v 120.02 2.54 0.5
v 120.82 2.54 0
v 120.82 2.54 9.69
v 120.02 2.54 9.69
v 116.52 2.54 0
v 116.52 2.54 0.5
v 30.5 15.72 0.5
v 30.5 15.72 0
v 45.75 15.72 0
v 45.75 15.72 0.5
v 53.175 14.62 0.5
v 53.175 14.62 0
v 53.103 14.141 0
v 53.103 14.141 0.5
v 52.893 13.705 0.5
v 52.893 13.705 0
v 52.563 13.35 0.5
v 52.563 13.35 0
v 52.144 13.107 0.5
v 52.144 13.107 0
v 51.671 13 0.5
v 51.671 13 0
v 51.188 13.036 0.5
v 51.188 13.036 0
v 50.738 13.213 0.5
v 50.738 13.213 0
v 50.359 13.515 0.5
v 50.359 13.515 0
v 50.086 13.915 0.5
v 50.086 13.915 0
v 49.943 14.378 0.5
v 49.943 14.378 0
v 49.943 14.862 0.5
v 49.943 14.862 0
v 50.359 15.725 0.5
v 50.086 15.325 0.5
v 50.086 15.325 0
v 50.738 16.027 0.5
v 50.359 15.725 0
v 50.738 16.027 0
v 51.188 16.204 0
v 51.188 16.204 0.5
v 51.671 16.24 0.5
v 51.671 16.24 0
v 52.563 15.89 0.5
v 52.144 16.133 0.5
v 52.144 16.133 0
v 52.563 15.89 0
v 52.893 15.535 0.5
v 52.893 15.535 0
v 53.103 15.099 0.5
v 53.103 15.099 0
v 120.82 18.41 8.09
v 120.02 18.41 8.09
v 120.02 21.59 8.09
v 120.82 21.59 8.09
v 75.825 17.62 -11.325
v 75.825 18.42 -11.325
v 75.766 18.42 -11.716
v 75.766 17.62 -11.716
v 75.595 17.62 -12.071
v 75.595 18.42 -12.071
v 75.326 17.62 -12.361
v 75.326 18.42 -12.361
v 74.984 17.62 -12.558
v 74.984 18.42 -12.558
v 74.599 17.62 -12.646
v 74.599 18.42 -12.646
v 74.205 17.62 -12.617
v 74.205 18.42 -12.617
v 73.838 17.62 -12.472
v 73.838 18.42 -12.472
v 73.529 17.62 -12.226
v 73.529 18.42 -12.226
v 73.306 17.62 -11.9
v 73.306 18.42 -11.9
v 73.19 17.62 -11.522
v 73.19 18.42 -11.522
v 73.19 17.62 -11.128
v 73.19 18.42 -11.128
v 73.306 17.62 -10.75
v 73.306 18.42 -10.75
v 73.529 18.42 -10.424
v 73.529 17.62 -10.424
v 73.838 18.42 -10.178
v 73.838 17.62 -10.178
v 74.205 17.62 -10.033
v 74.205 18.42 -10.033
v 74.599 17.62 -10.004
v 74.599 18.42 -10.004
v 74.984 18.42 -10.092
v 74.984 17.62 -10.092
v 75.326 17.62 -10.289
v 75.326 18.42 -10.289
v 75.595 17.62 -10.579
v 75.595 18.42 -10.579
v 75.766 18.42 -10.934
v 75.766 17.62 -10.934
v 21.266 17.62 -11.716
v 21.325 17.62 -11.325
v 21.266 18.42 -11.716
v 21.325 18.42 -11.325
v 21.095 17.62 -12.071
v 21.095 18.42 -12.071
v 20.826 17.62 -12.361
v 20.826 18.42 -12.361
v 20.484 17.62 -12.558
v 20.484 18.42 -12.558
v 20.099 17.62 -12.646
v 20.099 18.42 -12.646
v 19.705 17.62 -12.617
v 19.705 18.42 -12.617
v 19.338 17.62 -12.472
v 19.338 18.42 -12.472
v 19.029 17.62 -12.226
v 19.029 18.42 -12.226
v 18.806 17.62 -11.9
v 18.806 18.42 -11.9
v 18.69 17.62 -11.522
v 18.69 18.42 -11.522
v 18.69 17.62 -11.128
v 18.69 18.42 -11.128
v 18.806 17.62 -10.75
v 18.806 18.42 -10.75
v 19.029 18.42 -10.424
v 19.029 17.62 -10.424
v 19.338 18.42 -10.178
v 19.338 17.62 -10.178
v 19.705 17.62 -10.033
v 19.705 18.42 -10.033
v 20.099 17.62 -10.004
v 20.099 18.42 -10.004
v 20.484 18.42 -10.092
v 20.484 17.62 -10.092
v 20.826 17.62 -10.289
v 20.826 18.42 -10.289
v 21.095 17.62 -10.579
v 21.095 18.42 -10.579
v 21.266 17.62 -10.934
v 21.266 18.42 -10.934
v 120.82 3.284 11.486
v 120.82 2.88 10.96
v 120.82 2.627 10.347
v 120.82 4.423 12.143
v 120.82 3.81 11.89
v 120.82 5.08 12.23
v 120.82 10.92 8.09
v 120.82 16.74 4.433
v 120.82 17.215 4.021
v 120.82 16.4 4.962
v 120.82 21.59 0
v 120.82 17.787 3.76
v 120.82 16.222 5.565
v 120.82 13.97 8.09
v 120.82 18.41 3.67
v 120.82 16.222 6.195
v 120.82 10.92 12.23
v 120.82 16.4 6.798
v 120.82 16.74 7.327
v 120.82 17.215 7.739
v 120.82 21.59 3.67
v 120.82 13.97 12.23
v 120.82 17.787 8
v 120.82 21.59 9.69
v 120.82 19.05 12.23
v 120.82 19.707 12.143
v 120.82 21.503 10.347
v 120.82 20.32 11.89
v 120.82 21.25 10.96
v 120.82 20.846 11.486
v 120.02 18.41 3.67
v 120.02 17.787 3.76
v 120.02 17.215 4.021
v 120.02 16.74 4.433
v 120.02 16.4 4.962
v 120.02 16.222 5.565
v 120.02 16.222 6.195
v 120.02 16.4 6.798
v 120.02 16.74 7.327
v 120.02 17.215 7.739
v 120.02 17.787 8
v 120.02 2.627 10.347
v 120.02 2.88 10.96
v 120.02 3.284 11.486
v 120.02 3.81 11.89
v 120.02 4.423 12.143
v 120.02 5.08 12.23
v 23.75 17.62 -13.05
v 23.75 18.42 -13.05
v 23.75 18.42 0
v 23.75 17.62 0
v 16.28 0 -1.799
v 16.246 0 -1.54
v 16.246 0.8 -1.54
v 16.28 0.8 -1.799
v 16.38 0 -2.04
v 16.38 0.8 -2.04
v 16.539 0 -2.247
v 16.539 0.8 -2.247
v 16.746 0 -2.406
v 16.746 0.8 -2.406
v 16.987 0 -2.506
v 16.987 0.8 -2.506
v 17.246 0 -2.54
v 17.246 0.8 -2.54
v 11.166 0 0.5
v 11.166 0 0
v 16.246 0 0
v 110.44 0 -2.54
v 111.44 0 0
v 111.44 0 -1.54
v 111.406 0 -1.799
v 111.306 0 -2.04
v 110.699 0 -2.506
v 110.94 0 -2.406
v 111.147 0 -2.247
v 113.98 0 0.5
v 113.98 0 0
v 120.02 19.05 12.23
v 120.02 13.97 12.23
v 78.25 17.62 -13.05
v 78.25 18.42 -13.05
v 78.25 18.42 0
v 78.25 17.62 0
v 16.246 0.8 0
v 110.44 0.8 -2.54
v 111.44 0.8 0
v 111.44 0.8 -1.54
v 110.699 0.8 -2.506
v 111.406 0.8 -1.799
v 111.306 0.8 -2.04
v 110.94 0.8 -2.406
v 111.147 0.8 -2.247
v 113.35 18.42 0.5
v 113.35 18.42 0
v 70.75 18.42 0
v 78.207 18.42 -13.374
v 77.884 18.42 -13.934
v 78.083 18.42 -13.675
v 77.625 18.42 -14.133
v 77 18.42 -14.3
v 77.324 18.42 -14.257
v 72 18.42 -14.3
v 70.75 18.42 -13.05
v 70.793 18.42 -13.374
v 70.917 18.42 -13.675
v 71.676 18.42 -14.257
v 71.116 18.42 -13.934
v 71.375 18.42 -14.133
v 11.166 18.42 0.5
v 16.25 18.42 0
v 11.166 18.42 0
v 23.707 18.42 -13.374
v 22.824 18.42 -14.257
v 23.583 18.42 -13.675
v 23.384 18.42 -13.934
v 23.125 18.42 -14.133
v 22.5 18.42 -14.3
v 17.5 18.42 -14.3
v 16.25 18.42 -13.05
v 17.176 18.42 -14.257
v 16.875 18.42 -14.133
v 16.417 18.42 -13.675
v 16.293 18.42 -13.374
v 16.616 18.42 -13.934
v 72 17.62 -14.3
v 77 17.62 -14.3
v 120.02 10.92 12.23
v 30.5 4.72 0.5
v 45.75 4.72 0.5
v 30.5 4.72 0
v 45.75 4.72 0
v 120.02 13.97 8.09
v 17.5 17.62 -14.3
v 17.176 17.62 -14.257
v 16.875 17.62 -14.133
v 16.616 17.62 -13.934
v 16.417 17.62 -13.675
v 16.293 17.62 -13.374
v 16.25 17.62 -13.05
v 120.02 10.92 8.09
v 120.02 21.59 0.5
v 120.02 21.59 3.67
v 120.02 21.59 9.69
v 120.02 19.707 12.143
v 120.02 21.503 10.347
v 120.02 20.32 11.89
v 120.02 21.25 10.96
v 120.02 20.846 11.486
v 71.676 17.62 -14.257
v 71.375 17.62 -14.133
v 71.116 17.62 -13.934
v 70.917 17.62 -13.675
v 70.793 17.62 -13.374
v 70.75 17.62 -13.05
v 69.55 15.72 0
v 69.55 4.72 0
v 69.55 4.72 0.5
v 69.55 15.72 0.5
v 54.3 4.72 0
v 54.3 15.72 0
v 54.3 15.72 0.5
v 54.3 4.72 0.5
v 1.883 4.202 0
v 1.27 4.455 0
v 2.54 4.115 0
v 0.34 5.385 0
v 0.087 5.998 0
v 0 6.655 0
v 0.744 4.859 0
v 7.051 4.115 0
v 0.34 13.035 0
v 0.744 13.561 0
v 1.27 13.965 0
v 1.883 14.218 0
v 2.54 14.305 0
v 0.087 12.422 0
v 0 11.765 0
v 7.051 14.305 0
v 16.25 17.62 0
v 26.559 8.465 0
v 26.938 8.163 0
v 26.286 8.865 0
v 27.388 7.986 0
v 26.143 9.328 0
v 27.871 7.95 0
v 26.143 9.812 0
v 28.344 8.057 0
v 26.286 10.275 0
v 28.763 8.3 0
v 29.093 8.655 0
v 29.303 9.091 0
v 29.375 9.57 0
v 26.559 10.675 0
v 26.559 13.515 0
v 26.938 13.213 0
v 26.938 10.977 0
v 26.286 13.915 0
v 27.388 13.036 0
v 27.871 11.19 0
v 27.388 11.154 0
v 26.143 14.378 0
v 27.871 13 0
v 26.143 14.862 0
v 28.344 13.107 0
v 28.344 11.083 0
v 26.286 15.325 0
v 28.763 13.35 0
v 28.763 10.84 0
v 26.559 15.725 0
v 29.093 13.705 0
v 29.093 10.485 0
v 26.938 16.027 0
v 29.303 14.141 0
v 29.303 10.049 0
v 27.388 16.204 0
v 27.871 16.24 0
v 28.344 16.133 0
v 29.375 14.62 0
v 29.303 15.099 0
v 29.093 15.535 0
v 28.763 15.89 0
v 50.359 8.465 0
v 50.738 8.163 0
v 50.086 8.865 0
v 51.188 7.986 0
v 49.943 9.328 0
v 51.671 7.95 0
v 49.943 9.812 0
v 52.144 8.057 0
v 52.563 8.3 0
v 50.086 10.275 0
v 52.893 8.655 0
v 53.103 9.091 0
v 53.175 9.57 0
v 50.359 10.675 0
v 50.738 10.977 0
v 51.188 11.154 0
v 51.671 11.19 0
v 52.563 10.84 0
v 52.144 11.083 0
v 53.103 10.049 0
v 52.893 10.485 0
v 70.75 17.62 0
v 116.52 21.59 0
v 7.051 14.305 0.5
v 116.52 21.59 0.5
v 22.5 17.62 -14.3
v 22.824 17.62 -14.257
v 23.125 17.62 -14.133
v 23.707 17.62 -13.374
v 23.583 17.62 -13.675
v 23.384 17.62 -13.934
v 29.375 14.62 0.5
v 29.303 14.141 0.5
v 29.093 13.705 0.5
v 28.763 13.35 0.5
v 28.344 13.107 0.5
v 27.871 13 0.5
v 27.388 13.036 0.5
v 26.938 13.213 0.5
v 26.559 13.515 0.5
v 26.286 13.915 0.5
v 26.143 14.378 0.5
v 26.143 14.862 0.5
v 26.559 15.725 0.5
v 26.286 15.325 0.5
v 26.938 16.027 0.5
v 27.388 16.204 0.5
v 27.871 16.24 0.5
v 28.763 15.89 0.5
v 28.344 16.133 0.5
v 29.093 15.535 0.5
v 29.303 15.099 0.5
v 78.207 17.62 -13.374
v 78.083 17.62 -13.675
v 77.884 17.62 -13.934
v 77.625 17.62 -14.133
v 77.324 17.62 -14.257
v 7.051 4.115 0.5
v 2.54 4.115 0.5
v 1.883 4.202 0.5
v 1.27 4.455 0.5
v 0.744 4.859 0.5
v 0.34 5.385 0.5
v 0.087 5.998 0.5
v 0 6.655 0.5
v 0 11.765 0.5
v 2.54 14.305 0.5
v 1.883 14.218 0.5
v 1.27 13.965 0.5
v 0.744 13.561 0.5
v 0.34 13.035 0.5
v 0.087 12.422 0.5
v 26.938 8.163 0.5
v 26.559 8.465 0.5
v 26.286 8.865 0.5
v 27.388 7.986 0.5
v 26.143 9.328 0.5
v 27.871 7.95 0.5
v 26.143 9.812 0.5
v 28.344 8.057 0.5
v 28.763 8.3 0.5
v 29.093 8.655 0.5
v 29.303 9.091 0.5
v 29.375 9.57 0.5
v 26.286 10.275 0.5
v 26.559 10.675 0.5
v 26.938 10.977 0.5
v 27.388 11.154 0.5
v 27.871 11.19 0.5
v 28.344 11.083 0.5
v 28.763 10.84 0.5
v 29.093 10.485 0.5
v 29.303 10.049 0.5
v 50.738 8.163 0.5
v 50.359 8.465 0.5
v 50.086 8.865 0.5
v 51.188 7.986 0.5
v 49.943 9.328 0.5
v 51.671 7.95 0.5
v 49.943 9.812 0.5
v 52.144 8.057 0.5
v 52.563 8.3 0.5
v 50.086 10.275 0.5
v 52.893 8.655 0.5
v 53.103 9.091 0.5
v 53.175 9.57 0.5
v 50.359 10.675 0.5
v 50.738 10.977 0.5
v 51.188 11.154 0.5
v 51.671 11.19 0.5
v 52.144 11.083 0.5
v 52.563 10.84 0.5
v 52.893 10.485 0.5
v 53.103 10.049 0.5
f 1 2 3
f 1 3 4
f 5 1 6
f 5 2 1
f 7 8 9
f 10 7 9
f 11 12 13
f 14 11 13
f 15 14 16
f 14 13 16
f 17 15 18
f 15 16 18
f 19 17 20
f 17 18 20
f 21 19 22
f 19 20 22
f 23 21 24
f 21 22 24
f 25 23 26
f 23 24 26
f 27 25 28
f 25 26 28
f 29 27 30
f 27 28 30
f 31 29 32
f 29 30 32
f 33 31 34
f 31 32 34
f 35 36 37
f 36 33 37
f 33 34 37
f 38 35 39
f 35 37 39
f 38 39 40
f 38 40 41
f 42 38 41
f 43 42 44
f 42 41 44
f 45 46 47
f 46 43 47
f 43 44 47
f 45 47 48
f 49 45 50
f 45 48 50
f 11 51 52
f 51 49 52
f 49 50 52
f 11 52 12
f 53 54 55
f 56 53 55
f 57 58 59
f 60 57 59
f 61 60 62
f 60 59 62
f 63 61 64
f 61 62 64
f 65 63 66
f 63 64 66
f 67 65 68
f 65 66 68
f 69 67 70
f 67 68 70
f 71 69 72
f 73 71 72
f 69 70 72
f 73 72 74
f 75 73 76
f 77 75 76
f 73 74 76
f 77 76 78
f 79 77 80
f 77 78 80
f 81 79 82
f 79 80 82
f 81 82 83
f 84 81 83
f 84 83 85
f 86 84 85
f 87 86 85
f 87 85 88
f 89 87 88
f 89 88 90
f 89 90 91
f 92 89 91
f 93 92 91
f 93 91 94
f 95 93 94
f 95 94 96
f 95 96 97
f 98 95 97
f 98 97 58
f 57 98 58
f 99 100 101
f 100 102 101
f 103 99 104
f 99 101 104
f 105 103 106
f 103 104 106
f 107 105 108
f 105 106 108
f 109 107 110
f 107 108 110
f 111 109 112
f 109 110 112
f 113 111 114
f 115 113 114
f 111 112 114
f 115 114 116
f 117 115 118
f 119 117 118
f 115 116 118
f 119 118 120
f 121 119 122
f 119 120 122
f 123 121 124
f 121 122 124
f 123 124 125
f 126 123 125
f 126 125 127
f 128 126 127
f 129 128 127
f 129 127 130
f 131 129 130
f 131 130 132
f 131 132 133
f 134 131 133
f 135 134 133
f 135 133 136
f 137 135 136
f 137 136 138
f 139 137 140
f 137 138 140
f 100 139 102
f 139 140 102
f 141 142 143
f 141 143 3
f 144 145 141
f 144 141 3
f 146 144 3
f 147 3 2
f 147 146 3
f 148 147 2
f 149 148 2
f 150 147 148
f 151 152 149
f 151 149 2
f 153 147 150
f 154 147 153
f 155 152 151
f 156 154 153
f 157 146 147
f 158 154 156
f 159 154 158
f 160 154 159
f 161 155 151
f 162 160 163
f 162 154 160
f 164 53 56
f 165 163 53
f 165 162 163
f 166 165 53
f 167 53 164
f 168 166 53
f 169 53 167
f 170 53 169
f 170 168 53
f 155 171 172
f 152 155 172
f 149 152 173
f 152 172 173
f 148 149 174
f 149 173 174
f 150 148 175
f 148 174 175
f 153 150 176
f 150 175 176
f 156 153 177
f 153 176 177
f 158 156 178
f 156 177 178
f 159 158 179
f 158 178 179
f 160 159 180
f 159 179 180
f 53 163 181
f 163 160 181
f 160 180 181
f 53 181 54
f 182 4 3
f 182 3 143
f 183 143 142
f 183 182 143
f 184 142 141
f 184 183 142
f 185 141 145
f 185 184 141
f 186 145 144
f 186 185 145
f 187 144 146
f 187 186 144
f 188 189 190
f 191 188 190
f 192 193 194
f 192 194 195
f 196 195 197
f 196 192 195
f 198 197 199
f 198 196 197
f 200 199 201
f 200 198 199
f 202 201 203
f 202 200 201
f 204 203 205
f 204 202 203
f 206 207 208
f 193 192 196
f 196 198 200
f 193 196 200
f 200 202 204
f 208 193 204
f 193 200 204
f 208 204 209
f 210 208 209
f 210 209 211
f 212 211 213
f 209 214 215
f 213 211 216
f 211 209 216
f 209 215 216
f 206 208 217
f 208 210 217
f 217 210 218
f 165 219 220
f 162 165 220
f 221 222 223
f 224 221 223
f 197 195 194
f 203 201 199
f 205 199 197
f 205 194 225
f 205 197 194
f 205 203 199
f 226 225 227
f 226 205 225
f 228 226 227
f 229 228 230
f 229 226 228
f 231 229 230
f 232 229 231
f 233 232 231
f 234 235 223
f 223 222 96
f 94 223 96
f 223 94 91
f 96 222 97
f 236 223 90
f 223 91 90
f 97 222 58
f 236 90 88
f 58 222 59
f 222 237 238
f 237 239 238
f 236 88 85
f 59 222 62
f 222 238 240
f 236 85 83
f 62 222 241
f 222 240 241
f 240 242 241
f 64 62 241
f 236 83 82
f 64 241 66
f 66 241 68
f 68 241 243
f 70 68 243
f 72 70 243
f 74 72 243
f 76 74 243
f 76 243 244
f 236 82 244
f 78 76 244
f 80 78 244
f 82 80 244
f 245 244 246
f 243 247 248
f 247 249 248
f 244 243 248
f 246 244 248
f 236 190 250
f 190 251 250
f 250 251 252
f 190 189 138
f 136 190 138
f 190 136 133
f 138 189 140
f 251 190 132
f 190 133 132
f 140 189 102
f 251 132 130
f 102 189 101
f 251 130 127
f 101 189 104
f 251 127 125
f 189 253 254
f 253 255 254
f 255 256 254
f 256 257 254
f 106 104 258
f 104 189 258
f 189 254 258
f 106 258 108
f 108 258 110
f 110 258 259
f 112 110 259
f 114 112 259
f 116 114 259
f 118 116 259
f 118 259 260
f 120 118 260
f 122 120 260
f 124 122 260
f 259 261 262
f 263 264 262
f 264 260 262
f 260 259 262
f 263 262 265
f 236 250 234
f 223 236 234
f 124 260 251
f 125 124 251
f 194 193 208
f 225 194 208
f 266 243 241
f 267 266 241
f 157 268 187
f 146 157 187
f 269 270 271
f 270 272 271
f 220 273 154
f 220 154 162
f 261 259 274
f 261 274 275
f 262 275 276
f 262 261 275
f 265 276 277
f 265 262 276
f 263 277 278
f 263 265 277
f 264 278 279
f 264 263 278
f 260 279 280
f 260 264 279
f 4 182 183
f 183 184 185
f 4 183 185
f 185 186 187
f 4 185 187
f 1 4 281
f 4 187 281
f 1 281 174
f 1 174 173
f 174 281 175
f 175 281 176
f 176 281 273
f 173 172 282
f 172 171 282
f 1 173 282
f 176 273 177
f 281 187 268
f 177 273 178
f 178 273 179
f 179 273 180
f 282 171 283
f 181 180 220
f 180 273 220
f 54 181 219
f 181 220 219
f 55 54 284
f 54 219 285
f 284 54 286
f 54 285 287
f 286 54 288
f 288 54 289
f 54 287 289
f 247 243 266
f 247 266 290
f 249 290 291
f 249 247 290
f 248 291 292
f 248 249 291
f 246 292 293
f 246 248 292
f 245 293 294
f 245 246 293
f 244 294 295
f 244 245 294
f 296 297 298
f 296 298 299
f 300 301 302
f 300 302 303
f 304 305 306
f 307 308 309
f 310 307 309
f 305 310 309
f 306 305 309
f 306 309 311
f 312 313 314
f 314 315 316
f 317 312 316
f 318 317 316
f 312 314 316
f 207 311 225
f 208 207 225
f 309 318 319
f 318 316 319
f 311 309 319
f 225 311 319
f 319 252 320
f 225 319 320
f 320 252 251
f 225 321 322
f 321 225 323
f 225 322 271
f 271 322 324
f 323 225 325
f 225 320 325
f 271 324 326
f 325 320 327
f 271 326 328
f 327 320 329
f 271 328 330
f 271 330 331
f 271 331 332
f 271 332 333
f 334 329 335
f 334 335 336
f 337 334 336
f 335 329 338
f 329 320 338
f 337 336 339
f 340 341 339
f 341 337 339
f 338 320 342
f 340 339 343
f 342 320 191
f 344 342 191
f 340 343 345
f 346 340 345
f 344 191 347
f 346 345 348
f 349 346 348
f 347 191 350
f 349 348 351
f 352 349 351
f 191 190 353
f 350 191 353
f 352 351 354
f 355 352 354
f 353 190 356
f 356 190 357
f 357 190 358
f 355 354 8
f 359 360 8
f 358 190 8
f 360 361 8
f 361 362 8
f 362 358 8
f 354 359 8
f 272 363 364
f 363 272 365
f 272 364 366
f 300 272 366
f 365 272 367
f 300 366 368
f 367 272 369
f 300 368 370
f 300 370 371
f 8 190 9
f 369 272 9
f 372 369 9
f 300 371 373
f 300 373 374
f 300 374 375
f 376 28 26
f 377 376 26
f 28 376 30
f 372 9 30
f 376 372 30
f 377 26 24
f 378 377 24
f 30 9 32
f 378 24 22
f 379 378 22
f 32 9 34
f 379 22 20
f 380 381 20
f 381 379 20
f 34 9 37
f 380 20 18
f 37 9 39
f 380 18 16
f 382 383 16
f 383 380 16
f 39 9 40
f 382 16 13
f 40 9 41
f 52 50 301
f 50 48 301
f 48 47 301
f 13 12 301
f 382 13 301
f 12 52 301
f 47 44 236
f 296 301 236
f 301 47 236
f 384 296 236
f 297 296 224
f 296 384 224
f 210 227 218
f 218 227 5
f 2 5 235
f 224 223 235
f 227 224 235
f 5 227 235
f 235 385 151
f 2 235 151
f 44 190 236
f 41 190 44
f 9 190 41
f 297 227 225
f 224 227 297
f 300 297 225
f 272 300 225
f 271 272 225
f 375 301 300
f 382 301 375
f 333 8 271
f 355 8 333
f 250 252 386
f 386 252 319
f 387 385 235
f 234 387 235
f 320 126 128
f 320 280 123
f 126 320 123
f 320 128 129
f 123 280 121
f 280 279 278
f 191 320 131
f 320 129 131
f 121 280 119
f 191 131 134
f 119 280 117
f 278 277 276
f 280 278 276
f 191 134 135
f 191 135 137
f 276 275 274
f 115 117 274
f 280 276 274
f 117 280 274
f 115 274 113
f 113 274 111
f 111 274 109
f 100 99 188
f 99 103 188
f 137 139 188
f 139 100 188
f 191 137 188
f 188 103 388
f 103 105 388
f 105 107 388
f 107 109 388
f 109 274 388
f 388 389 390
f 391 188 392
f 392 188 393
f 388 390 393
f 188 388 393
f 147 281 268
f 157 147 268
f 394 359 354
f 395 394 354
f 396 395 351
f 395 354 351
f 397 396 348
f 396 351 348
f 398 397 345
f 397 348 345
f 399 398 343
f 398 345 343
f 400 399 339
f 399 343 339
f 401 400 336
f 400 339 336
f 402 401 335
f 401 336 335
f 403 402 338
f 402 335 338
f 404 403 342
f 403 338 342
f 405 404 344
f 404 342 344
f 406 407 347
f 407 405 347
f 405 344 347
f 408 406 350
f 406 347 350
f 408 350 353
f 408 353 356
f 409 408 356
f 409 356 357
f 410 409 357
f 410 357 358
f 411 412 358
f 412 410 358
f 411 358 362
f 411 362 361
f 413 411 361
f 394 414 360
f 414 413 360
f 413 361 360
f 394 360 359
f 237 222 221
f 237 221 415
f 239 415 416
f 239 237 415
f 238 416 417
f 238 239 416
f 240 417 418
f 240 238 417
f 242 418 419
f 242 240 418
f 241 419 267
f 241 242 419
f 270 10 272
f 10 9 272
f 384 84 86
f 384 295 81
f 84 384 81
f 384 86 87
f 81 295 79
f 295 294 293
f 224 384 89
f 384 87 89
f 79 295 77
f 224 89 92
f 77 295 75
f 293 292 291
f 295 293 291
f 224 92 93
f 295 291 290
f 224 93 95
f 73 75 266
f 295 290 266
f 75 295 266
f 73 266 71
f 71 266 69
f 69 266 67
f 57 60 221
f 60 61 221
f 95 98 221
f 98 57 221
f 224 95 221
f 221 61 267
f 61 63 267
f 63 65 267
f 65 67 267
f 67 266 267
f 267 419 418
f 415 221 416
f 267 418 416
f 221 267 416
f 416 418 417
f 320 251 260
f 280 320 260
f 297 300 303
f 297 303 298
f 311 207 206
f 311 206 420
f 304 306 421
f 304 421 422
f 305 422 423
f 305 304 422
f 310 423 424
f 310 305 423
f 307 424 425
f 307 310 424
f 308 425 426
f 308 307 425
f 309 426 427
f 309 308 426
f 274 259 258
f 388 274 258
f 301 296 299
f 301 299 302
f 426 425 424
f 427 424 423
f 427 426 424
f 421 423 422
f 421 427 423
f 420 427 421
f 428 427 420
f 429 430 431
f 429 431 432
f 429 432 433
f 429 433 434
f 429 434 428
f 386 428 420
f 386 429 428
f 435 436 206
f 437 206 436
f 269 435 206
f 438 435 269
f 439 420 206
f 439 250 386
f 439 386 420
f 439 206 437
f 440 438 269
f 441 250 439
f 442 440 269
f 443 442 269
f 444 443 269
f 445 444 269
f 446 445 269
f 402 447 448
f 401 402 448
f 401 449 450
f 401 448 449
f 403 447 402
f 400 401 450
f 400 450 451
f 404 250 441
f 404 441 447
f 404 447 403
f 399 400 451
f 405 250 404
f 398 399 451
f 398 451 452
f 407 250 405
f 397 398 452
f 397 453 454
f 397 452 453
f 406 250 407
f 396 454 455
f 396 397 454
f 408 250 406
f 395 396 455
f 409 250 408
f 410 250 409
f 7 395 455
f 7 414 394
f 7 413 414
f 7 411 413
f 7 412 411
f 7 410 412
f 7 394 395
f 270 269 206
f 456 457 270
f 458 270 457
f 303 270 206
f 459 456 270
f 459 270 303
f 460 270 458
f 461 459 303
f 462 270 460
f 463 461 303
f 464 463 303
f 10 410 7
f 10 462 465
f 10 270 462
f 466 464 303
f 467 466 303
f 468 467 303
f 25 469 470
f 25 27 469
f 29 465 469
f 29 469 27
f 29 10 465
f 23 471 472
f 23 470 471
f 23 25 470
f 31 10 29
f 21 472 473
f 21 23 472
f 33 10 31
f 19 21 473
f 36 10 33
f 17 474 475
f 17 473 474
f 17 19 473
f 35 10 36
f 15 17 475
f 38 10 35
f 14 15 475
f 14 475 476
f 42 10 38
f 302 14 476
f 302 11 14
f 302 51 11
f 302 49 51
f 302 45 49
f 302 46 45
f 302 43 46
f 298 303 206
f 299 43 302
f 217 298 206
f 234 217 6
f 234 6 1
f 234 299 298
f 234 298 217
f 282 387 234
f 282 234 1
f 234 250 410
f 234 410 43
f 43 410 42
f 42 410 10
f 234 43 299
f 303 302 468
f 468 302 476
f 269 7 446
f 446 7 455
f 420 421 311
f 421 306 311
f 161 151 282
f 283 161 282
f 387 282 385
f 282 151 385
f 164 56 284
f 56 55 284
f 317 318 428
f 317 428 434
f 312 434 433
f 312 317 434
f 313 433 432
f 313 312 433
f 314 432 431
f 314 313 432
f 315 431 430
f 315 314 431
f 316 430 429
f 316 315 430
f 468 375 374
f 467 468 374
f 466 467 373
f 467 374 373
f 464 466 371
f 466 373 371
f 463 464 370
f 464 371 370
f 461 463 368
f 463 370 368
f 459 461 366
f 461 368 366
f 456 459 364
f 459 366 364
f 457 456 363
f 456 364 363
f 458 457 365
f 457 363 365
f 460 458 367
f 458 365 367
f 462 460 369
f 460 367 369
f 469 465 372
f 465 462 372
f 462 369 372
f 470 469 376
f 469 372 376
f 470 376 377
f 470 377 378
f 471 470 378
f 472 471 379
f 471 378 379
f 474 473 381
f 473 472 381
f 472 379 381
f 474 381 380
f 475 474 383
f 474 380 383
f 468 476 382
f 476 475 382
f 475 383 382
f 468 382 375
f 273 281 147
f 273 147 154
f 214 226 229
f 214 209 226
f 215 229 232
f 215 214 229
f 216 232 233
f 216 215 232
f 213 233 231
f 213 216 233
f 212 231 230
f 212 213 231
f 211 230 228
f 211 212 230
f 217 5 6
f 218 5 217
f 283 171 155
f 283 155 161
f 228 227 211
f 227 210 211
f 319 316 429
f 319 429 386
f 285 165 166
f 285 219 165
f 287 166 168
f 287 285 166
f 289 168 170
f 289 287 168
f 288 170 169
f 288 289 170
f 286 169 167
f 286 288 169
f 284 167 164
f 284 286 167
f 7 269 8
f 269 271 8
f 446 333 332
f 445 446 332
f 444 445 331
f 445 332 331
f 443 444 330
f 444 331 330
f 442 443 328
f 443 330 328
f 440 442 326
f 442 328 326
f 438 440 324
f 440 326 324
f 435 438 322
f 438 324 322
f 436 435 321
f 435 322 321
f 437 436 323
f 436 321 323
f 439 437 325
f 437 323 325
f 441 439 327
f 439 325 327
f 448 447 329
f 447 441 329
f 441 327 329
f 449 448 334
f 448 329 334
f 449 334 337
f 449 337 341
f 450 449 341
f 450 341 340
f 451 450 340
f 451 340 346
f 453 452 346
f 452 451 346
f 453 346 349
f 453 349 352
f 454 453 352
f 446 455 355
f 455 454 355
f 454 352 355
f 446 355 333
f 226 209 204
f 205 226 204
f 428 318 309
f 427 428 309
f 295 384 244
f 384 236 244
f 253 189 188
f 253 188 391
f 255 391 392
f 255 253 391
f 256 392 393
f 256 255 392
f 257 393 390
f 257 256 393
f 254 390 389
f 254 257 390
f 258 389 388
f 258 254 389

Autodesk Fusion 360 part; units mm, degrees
sketch "Face" plane through (0, 0, 0) normal (0, 0, 1) x (1, 0, 0)
  line L0 (0, 0) -> (120.02, 0) construction
  line L1 (120.02, 0) -> (120.02, 21.59) construction
  line L2 (120.02, 21.59) -> (0, 21.59) construction
  line L3 (0, 21.59) -> (0, 6.655) construction
  line L4 (120.02, 2.54) -> (116.52, 2.54)
  line L5 (120.02, 21.59) -> (116.52, 21.59)
  line L6 (116.52, 2.54) -> (113.98, 0)
  line L7 (116.52, 2.54) -> (120.1121, 2.54) construction
  line L8 (116.52, 21.59) -> (113.35, 18.42)
  line L9 (116.52, 21.59) -> (120.02, 21.59) construction
  line L10 (113.35, 18.42) -> (11.1657, 18.42)
  line L11 (11.1657, 0) -> (7.0507, 4.115)
  line L12 (11.1657, 0) -> (18.2593, 0) construction
  line L13 (11.1657, 18.42) -> (7.0507, 14.305)
  line L14 (11.1657, 18.42) -> (18.3401, 18.42) construction
  line L15 (7.24, 21.59) -> (7.24, 0) construction
  line L16 (0, 9.21) -> (7.24, 9.21) construction
  line L17 (0, 9.21) -> (0, 14.305) construction
  line L18 (0, 9.21) -> (0, 4.115) construction
  line L19 (2.54, 14.305) -> (7.0507, 14.305)
  line L20 (2.54, 4.115) -> (7.0507, 4.115)
  line L21 (0, 9.21) -> (13.01, 9.21) construction
  line L22 (11.1657, 0) -> (113.98, 0)
  line L23 (120.02, 21.59) -> (120.02, 2.54)
  arc A0 (2.54, 14.305) -> (0, 11.765) centre (2.54, 11.765) ccw
  arc A1 (0, 6.655) -> (2.54, 4.115) centre (2.54, 6.655) ccw
  line L24 (0, 11.765) -> (0, 6.655)
  line L25 (0, 9.21) -> (30.5, 9.21) construction
  line L26 (0, 9.21) -> (54.3, 9.21) construction
  line L27 (30.5, 0) -> (30.5, 21.59) construction
  line L28 (45.75, 0) -> (45.75, 21.59) construction
  line L29 (54.3, 9.21) -> (69.55, 9.21) construction
  line L30 (27.75, 18.42) -> (27.75, 0) construction
  line L31 (27.75, 14.62) -> (30.5, 14.62) construction
  circle A2 centre (27.75, 14.62) radius 1.625
  line L32 (27.75, 9.57) -> (30.5, 9.57) construction
  circle A3 centre (27.75, 9.57) radius 1.625
  line L33 (69.55, 9.21) -> (69.55, 18.42) construction
  line L34 (30.5, 18.42) -> (69.55, 18.42) construction
  line L35 (69.55, 18.42) -> (69.55, 15.72) construction
  line L36 (69.55, 15.72) -> (30.5, 15.72) construction
  line L37 (30.5, 15.72) -> (30.5, 18.42) construction
  line L38 (30.5, 15.72) -> (45.75, 15.72)
  line L39 (45.75, 15.72) -> (45.75, 4.72)
  line L40 (45.75, 4.72) -> (30.5, 4.72)
  line L41 (30.5, 4.72) -> (30.5, 15.72)
  line L42 (69.55, 15.72) -> (54.3, 15.72)
  line L43 (54.3, 15.72) -> (54.3, 4.72)
  line L44 (54.3, 4.72) -> (69.55, 4.72)
  line L45 (69.55, 4.72) -> (69.55, 15.72)
  circle A4 centre (51.55, 14.62) radius 1.625
  circle A5 centre (51.55, 9.57) radius 1.625
  dimension "d1" = 120.02
  dimension "d2" = 21.59
  dimension "d3" = 19.05
  dimension "d4" = 3.5
  dimension "d6" = 135
  dimension "d7" = 135
  dimension "d8" = 18.42
  dimension "d9" = 135
  dimension "d10" = 135
  dimension "d13" = 9.21
  dimension "d14" = 5.095
  dimension "d15" = 5.095
  dimension "d16" = 10.19
  dimension "d17" = 13.01
  dimension "d35" = 2.54
  dimension "d36" = 2.54
  dimension "d37" = 30.5
  dimension "d38" = 54.3
  dimension "d39" = 15.25
  dimension "d42" = 15.25
  dimension "d45" = 2.75
  dimension "d46" = 3.8
  dimension "d47" = 3.25
  dimension "d48" = 8.85
  dimension "d49" = 3.25
  dimension "d51" = 2.7
  dimension "d52" = 11
  dimension "d53" = 11
  dimension "d54" = 3.25
  dimension "d55" = 3.25
ref_plane "WorkPlane1" through (120.02, 0, 0) normal (1, 0, 0) x (0, 1, 0)
sketch "Arm" plane through (120.02, 0, 0) normal (1, 0, 0) x (0, 1, 0)
  line L0 (0, 0) -> (21.59, 0) construction
  line L1 (21.59, 0) -> (21.59, 12.23) construction
  line L2 (19.05, 12.23) -> (5.08, 12.23) construction
  line L3 (0, 12.23) -> (0, 0) construction
  line L4 (0, 0) -> (2.54, 0) construction
  line L5 (2.54, 0) -> (2.54, 11.43) construction
  line L6 (2.54, 11.43) -> (0, 11.43) construction
  line L7 (0, 11.43) -> (0, 0) construction
  line L8 (21.59, 12.23) -> (18.41, 12.23) construction
  line L9 (18.41, 12.23) -> (18.41, 0) construction
  line L10 (18.41, 5.88) -> (21.59, 5.88) construction
  line L11 (21.59, 5.88) -> (21.59, 12.23) construction
  line L12 (2.54, 9.69) -> (2.54, 0)
  line L13 (2.54, 0) -> (21.59, 0)
  line L14 (18.41, 8.09) -> (21.5902, 8.09)
  line L15 (18.41, 3.67) -> (21.594, 3.67)
  arc A0 (18.41, 8.09) -> (18.41, 3.67) centre (18.41, 5.88) ccw
  line L16 (2.54, 12.23) -> (10.92, 12.23) construction
  line L17 (10.92, 12.23) -> (10.92, 0) construction
  line L18 (10.92, 0) -> (2.54, 0) construction
  line L19 (2.54, 0) -> (2.54, 12.23) construction
  line L20 (10.92, 12.23) -> (13.97, 12.23) construction
  line L21 (13.97, 12.23) -> (13.97, 0) construction
  line L22 (13.97, 0) -> (10.92, 0) construction
  line L23 (10.92, 0) -> (10.92, 12.23) construction
  line L24 (21.5902, 8.09) -> (2.54, 8.09) construction
  line L25 (10.92, 8.09) -> (13.97, 8.09)
  line L26 (13.97, 8.09) -> (13.97, 12.23)
  line L27 (21.59, 12.23) -> (13.97, 12.23)
  line L28 (10.92, 12.23) -> (2.54, 12.23)
  line L29 (13.97, 8.09) -> (16.3602, 12.23)
  line L30 (13.97, 8.09) -> (18.4336, 8.09) construction
  line L31 (10.92, 8.09) -> (8.5298, 12.23)
  line L32 (10.92, 8.09) -> (15.5777, 8.09) construction
  line L33 (21.59, 0) -> (21.59, 3.67)
  line L34 (21.59, 8.09) -> (21.59, 9.69)
  arc A1 (21.59, 9.69) -> (19.05, 12.23) centre (19.05, 9.69) ccw
  arc A2 (5.08, 12.23) -> (2.54, 9.69) centre (5.08, 9.69) ccw
  line L35 (0, 0) -> (2.54, 0)
  line L36 (2.54, 0) -> (2.54, 0.8)
  line L37 (2.54, 0.8) -> (0, 0.8)
  line L38 (0, 0.8) -> (0, 0)
  line L39 (10.92, 8.09) -> (10.92, 12.23)
  line L40 (2.54, 0.8) -> (21.59, 0.8016) construction
  dimension "d20" = 21.59
  dimension "d21" = 12.23
  dimension "d22" = 2.54
  dimension "d23" = 3.18
  dimension "d24" = 6.35
  dimension "d25" = 4.42
  dimension "d26" = 8.38
  dimension "d27" = 3.05
  dimension "d28" = 60
  dimension "d29" = 120
  dimension "d30" = 2.54
  dimension "d31" = 2.54
  dimension "d32" = 2.54
  dimension "d33" = 0.8
  dimension "d34" = 11.43
ref_plane "WorkPlane2" through (0, 18.42, 0) normal (0, 1, 0) x (0, 0, 1)
sketch "Tabs" plane through (0, 18.42, 0) normal (0, 1, 0) x (1, 0, 0)
  line L0 (0, 0) -> (23.75, 0) construction
  line L1 (23.75, 0) -> (23.75, 13.05) construction
  line L2 (22.5, 14.3) -> (17.5, 14.3) construction
  line L3 (0, 14.3) -> (0, 0) construction
  line L4 (23.75, 0) -> (16.25, 0)
  line L5 (16.25, 0) -> (16.25, 13.05)
  line L6 (16.25, 14.3) -> (22.5, 14.3)
  line L7 (23.75, 13.05) -> (23.75, 0)
  line L8 (70.75, 0) -> (70.75, 13.05)
  line L9 (72, 14.3) -> (77, 14.3)
  line L10 (78.25, 13.05) -> (78.25, 0)
  line L11 (78.25, 0) -> (70.75, 0)
  line L12 (16.25, 11.325) -> (23.75, 11.325) construction
  line L13 (0, 0) -> (120.02, 0)
  circle A0 centre (20, 11.325) radius 1.325
  circle A1 centre (74.5, 11.325) radius 1.325
  arc A2 (17.5, 14.3) -> (16.25, 13.05) centre (17.5, 13.05) ccw
  arc A3 (72, 14.3) -> (70.75, 13.05) centre (72, 13.05) ccw
  arc A4 (78.25, 13.05) -> (77, 14.3) centre (77, 13.05) ccw
  arc A5 (23.75, 13.05) -> (22.5, 14.3) centre (22.5, 13.05) ccw
  line L14 (23.75, 13.05) -> (23.75, 14.3) construction
  line L15 (22.5, 14.3) -> (23.75, 14.3) construction
  dimension "d57" = 23.75
  dimension "d58" = 14.3
  dimension "d59" = 7.5
  dimension "d60" = 7.5
  dimension "d62" = 54.5
  dimension "d63" = 85.75
  dimension "d64" = 11.325
  dimension "d65" = 2.65
  dimension "d66" = 2.65
  dimension "d67" = 1.25
  dimension "d69" = 1.25
  dimension "d70" = 1.25
  dimension "d79" = 1.25
extrude "Extrude1" add sketch "Face" along normal blind 0.5
extrude "Extrude2" add sketch "Arm" along normal blind 0.8 contours L12 L13 L14 L15 A0 L25 L27 L28 L29 L31 L33 L34 A1 A2 L36 | L28 L31 L39 | L26 L27 L29
extrude "Extrude3" add sketch "Tabs" against normal blind 0.8 contours L8 L9 L10 L11 L13 A3 A4
extrude "Extrude4" add sketch "Tabs" against normal blind 0.8 contours L4 L5 L6 L7 L13 A2 A5
sketch "Sketch5" plane through (0, 0, 0) normal (0, 1, 0) x (1, 0, 0)
  line L0 (0, 0) -> (113.98, 0) construction
  line L1 (113.98, 0) -> (113.98, 2.54) construction
  line L2 (113.98, 2.54) -> (0, 2.54) construction
  line L3 (0, 2.54) -> (0, 0) construction
  line L4 (11.166, 0) -> (11.166, 2.54) construction
  line L5 (16.246, 0) -> (16.246, 2) construction
  line L6 (111.44, 0) -> (111.44, 1.54) construction
  line L7 (16.246, 0) -> (111.44, 0)
  line L8 (111.44, 0) -> (111.44, 2.54)
  line L9 (110.44, 2.54) -> (17.246, 2.54)
  line L10 (16.246, 1.54) -> (16.246, 0)
  arc A0 (17.246, 2.54) -> (16.246, 1.54) centre (17.246, 1.54) ccw
  arc A1 (111.44, 1.54) -> (110.44, 2.54) centre (110.44, 1.54) ccw
  dimension "d86" = 113.98
  dimension "d87" = 2.54
  dimension "d88" = 11.166
  dimension "d89" = 5.08
  dimension "d90" = 2.54
  dimension "d91" = 1
  dimension "d92" = 1
extrude "Extrude5" add sketch "Sketch5" along normal blind 0.8
